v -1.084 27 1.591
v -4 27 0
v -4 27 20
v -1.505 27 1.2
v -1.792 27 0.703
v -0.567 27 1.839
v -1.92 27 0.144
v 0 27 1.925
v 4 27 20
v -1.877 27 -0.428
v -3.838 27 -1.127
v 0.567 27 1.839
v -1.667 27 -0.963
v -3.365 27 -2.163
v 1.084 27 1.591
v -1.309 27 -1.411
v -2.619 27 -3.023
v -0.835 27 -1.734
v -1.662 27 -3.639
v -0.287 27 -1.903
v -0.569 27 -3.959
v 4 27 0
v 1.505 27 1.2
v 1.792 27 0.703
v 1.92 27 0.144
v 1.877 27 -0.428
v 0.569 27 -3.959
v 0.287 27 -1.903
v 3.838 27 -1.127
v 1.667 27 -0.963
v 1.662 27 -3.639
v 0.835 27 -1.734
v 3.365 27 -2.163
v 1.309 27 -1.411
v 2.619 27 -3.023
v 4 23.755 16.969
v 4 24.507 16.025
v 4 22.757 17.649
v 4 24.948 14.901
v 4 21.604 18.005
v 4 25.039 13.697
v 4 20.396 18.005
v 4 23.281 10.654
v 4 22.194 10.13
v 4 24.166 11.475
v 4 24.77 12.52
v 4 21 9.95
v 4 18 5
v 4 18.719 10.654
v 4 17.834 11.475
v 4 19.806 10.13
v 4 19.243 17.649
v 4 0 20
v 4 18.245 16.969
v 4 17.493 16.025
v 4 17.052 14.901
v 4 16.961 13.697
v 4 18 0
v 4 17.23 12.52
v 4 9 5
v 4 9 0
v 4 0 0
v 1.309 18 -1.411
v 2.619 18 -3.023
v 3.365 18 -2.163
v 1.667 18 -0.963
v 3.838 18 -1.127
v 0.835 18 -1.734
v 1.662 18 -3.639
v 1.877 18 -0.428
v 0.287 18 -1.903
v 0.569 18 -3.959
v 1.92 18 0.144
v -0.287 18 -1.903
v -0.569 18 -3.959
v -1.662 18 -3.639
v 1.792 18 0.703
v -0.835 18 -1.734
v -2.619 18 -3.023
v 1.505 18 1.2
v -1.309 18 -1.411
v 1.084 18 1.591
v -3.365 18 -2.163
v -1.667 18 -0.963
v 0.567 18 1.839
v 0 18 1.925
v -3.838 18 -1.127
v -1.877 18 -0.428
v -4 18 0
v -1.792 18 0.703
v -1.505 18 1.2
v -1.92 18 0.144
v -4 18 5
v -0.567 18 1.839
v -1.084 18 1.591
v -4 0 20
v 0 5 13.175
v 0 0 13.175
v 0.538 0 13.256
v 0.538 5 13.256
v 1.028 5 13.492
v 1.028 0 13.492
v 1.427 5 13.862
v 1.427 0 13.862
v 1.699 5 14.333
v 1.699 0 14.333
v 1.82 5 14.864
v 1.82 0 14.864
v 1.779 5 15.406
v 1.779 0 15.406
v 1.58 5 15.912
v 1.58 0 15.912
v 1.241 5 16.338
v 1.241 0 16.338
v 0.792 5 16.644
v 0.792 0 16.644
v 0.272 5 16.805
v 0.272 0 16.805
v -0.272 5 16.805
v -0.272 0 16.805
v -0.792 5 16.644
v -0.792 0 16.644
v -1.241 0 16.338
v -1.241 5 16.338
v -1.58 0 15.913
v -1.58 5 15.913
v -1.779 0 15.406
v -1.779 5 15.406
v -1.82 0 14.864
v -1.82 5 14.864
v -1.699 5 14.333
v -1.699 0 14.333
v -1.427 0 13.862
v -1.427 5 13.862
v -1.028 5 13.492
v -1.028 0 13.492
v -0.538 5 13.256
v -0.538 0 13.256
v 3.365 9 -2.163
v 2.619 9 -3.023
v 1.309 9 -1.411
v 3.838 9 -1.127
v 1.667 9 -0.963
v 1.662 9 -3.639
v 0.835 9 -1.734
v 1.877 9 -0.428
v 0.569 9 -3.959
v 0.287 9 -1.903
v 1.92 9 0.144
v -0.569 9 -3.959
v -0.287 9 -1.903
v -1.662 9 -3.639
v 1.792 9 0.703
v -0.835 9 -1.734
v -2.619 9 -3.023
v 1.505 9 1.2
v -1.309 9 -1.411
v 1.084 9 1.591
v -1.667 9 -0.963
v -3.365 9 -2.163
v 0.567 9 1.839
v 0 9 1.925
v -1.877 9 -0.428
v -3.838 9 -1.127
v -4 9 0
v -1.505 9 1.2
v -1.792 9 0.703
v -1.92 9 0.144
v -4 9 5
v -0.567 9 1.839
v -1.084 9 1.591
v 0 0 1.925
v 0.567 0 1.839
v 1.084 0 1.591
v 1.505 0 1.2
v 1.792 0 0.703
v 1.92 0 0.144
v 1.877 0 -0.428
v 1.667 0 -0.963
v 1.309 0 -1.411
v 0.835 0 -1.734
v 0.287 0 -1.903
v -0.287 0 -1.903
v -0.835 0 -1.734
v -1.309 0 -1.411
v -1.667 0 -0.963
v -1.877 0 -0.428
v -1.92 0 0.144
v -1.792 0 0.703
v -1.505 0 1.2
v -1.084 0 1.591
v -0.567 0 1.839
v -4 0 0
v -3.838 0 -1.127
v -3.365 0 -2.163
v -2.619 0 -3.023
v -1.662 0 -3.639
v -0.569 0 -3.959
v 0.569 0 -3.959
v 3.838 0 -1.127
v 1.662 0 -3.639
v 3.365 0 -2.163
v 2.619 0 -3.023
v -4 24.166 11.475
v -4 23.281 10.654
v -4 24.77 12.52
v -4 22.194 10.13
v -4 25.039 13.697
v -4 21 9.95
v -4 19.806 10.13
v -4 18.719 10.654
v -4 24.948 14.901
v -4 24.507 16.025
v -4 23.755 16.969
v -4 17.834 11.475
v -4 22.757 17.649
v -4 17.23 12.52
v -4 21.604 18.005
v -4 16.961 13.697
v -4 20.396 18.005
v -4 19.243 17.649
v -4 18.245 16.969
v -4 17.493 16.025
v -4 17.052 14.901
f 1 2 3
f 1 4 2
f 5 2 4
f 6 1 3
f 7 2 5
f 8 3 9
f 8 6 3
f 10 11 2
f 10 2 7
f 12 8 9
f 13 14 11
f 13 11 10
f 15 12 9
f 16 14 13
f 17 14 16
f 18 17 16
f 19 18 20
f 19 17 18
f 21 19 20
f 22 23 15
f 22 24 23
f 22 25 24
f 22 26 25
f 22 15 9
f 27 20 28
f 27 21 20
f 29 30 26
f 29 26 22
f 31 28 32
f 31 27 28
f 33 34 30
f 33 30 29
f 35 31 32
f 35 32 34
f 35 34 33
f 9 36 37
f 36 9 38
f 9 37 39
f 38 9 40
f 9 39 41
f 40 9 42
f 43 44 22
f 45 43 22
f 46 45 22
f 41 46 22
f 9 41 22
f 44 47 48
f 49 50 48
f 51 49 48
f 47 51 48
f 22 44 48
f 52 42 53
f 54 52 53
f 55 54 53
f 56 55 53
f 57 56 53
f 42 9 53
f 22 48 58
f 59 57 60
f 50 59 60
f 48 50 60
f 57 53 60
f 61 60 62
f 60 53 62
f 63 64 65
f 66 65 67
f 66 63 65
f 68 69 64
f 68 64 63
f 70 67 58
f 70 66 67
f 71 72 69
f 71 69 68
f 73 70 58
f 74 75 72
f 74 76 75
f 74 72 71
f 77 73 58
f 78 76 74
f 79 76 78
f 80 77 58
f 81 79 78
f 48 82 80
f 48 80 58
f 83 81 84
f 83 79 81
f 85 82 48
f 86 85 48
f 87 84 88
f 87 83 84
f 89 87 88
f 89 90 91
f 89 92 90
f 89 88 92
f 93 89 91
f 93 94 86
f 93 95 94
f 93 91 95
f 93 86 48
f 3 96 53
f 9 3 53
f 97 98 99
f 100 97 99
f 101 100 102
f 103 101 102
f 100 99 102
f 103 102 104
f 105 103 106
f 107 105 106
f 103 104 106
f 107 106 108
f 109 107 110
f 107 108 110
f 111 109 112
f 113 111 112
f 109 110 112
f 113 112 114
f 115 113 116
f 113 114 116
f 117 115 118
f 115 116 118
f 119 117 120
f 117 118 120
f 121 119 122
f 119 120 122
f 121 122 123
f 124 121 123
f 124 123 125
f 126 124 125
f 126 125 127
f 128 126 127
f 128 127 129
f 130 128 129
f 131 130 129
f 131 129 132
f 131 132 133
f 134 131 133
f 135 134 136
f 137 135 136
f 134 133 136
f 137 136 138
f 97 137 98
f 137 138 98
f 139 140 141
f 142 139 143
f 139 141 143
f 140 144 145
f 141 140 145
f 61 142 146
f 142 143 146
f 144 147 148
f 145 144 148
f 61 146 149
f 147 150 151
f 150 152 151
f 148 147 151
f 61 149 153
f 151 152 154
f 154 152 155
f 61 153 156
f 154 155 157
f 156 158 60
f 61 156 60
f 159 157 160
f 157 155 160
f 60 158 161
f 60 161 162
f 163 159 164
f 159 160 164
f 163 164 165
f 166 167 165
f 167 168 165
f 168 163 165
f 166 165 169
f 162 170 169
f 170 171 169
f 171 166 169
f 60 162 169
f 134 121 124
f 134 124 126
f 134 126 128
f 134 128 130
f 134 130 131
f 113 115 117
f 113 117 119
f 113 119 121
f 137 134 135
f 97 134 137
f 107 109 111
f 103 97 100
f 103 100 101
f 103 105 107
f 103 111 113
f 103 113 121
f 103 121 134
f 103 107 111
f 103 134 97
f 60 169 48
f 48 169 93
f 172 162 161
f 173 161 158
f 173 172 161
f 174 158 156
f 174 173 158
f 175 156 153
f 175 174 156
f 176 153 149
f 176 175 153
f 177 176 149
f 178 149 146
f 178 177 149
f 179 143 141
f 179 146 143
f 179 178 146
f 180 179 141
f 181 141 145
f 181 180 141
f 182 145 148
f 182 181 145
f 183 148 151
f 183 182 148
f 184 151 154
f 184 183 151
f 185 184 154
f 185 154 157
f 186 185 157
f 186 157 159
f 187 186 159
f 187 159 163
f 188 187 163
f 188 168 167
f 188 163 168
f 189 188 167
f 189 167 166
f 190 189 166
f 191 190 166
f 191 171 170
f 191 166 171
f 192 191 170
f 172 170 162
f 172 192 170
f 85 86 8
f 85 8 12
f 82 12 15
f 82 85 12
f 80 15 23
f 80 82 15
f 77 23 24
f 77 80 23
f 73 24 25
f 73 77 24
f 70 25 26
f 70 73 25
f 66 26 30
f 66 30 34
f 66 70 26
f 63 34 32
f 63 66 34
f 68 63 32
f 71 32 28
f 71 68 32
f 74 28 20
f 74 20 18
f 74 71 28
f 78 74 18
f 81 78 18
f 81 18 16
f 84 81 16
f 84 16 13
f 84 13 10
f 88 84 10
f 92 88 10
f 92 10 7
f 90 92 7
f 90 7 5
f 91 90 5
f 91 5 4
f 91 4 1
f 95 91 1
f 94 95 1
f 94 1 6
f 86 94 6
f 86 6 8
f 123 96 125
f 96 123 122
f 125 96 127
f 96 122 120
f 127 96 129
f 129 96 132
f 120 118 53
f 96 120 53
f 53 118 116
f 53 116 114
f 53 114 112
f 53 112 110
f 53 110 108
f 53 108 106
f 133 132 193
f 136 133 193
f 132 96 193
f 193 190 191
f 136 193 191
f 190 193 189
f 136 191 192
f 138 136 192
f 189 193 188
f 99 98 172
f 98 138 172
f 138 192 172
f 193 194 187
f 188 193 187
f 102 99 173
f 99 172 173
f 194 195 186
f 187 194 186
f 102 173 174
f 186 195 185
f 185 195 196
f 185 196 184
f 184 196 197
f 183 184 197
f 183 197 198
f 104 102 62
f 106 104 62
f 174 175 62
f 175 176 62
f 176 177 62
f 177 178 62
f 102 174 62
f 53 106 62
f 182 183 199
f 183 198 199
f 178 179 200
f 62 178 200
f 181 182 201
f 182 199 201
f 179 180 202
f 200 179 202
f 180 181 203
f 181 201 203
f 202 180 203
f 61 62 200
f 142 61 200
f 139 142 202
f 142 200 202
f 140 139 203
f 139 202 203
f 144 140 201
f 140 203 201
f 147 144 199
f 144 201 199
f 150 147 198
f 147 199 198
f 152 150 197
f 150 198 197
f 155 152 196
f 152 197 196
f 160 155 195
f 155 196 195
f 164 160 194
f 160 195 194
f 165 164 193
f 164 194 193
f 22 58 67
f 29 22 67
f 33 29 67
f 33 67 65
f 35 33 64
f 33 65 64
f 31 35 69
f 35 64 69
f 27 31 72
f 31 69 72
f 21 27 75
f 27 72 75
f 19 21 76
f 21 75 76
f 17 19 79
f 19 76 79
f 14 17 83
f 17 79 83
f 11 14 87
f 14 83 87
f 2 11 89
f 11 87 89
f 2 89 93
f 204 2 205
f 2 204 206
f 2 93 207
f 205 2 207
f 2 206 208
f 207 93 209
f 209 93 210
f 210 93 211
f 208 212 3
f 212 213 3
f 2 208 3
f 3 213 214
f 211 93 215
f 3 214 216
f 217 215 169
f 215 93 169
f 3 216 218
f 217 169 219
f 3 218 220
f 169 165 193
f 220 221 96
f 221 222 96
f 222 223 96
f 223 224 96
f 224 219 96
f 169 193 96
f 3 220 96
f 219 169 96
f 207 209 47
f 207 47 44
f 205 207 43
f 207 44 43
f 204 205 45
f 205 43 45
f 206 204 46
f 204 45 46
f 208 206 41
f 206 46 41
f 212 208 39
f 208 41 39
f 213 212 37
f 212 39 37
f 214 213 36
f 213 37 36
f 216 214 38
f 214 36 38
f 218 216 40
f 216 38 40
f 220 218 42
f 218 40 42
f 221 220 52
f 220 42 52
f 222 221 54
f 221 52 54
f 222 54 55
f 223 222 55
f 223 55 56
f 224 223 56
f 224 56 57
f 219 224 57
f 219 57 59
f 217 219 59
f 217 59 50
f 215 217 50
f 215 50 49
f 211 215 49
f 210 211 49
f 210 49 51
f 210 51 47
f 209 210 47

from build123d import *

# Parameters (mm, degrees)
SKETCH2_R           = 4
SKETCH2_R_2         = 1.925
BOSS_EXTRUDE1_DEPTH = 27
SKETCH3_R           = 4.05
CUT_EXTRUDE1_DEPTH  = 25
SKETCH5_W           = 9
SKETCH5_H           = 9
CUT_EXTRUDE2_DEPTH  = 25
SKETCH6_R           = 1.825
CUT_EXTRUDE3_DEPTH  = 5


with BuildPart() as part:
    # Sketch2 → Boss-Extrude1 (new body)
    # profile 1 of 2: a face of its own
    with BuildSketch(Plane(origin=(0, 0, 0), x_dir=(1, 0, 0), z_dir=(0, 1, 0))):
        Circle(SKETCH2_R)
        with Locations(Location((0, 0, 0), (0, 0, 270))):
            Circle(SKETCH2_R_2, mode=Mode.SUBTRACT)
    # profile 2 of 2: a face of its own
    with BuildSketch(Plane(origin=(0, 0, 0), x_dir=(1, 0, 0), z_dir=(0, 1, 0))):
        with BuildLine():
            ThreePointArc((4, 0), (0, -4), (-4, 0))
            Line((-4, 0), (-4, -20))
            Line((-4, -20), (4, -20))
            Line((4, -20), (4, 0))
        make_face()
    extrude(amount=BOSS_EXTRUDE1_DEPTH)

    # Sketch3 → Cut-Extrude1 (cut)
    with BuildSketch(Plane(origin=(4, 0, 0), x_dir=(0, 0, -1), z_dir=(1, 0, 0))):
        with Locations((-14, 21)):
            Circle(SKETCH3_R)
    extrude(amount=-CUT_EXTRUDE1_DEPTH, mode=Mode.SUBTRACT)

    # Sketch5 → Cut-Extrude2 (cut)
    with BuildSketch(Plane.ZY.offset(4)):
        with Locations((0.5, 13.5)):
            Rectangle(SKETCH5_W, SKETCH5_H)
    extrude(amount=-CUT_EXTRUDE2_DEPTH, mode=Mode.SUBTRACT)

    # Sketch6 → Cut-Extrude3 (cut)
    with BuildSketch(Plane(origin=(0, 0, 0), x_dir=(-1, 0, 0), z_dir=(0, -1, 0))):
        with Locations(Location((0, -15, 0), (0, 0, 90))):
            Circle(SKETCH6_R)
    extrude(amount=-CUT_EXTRUDE3_DEPTH, mode=Mode.SUBTRACT)


solid = part.part
